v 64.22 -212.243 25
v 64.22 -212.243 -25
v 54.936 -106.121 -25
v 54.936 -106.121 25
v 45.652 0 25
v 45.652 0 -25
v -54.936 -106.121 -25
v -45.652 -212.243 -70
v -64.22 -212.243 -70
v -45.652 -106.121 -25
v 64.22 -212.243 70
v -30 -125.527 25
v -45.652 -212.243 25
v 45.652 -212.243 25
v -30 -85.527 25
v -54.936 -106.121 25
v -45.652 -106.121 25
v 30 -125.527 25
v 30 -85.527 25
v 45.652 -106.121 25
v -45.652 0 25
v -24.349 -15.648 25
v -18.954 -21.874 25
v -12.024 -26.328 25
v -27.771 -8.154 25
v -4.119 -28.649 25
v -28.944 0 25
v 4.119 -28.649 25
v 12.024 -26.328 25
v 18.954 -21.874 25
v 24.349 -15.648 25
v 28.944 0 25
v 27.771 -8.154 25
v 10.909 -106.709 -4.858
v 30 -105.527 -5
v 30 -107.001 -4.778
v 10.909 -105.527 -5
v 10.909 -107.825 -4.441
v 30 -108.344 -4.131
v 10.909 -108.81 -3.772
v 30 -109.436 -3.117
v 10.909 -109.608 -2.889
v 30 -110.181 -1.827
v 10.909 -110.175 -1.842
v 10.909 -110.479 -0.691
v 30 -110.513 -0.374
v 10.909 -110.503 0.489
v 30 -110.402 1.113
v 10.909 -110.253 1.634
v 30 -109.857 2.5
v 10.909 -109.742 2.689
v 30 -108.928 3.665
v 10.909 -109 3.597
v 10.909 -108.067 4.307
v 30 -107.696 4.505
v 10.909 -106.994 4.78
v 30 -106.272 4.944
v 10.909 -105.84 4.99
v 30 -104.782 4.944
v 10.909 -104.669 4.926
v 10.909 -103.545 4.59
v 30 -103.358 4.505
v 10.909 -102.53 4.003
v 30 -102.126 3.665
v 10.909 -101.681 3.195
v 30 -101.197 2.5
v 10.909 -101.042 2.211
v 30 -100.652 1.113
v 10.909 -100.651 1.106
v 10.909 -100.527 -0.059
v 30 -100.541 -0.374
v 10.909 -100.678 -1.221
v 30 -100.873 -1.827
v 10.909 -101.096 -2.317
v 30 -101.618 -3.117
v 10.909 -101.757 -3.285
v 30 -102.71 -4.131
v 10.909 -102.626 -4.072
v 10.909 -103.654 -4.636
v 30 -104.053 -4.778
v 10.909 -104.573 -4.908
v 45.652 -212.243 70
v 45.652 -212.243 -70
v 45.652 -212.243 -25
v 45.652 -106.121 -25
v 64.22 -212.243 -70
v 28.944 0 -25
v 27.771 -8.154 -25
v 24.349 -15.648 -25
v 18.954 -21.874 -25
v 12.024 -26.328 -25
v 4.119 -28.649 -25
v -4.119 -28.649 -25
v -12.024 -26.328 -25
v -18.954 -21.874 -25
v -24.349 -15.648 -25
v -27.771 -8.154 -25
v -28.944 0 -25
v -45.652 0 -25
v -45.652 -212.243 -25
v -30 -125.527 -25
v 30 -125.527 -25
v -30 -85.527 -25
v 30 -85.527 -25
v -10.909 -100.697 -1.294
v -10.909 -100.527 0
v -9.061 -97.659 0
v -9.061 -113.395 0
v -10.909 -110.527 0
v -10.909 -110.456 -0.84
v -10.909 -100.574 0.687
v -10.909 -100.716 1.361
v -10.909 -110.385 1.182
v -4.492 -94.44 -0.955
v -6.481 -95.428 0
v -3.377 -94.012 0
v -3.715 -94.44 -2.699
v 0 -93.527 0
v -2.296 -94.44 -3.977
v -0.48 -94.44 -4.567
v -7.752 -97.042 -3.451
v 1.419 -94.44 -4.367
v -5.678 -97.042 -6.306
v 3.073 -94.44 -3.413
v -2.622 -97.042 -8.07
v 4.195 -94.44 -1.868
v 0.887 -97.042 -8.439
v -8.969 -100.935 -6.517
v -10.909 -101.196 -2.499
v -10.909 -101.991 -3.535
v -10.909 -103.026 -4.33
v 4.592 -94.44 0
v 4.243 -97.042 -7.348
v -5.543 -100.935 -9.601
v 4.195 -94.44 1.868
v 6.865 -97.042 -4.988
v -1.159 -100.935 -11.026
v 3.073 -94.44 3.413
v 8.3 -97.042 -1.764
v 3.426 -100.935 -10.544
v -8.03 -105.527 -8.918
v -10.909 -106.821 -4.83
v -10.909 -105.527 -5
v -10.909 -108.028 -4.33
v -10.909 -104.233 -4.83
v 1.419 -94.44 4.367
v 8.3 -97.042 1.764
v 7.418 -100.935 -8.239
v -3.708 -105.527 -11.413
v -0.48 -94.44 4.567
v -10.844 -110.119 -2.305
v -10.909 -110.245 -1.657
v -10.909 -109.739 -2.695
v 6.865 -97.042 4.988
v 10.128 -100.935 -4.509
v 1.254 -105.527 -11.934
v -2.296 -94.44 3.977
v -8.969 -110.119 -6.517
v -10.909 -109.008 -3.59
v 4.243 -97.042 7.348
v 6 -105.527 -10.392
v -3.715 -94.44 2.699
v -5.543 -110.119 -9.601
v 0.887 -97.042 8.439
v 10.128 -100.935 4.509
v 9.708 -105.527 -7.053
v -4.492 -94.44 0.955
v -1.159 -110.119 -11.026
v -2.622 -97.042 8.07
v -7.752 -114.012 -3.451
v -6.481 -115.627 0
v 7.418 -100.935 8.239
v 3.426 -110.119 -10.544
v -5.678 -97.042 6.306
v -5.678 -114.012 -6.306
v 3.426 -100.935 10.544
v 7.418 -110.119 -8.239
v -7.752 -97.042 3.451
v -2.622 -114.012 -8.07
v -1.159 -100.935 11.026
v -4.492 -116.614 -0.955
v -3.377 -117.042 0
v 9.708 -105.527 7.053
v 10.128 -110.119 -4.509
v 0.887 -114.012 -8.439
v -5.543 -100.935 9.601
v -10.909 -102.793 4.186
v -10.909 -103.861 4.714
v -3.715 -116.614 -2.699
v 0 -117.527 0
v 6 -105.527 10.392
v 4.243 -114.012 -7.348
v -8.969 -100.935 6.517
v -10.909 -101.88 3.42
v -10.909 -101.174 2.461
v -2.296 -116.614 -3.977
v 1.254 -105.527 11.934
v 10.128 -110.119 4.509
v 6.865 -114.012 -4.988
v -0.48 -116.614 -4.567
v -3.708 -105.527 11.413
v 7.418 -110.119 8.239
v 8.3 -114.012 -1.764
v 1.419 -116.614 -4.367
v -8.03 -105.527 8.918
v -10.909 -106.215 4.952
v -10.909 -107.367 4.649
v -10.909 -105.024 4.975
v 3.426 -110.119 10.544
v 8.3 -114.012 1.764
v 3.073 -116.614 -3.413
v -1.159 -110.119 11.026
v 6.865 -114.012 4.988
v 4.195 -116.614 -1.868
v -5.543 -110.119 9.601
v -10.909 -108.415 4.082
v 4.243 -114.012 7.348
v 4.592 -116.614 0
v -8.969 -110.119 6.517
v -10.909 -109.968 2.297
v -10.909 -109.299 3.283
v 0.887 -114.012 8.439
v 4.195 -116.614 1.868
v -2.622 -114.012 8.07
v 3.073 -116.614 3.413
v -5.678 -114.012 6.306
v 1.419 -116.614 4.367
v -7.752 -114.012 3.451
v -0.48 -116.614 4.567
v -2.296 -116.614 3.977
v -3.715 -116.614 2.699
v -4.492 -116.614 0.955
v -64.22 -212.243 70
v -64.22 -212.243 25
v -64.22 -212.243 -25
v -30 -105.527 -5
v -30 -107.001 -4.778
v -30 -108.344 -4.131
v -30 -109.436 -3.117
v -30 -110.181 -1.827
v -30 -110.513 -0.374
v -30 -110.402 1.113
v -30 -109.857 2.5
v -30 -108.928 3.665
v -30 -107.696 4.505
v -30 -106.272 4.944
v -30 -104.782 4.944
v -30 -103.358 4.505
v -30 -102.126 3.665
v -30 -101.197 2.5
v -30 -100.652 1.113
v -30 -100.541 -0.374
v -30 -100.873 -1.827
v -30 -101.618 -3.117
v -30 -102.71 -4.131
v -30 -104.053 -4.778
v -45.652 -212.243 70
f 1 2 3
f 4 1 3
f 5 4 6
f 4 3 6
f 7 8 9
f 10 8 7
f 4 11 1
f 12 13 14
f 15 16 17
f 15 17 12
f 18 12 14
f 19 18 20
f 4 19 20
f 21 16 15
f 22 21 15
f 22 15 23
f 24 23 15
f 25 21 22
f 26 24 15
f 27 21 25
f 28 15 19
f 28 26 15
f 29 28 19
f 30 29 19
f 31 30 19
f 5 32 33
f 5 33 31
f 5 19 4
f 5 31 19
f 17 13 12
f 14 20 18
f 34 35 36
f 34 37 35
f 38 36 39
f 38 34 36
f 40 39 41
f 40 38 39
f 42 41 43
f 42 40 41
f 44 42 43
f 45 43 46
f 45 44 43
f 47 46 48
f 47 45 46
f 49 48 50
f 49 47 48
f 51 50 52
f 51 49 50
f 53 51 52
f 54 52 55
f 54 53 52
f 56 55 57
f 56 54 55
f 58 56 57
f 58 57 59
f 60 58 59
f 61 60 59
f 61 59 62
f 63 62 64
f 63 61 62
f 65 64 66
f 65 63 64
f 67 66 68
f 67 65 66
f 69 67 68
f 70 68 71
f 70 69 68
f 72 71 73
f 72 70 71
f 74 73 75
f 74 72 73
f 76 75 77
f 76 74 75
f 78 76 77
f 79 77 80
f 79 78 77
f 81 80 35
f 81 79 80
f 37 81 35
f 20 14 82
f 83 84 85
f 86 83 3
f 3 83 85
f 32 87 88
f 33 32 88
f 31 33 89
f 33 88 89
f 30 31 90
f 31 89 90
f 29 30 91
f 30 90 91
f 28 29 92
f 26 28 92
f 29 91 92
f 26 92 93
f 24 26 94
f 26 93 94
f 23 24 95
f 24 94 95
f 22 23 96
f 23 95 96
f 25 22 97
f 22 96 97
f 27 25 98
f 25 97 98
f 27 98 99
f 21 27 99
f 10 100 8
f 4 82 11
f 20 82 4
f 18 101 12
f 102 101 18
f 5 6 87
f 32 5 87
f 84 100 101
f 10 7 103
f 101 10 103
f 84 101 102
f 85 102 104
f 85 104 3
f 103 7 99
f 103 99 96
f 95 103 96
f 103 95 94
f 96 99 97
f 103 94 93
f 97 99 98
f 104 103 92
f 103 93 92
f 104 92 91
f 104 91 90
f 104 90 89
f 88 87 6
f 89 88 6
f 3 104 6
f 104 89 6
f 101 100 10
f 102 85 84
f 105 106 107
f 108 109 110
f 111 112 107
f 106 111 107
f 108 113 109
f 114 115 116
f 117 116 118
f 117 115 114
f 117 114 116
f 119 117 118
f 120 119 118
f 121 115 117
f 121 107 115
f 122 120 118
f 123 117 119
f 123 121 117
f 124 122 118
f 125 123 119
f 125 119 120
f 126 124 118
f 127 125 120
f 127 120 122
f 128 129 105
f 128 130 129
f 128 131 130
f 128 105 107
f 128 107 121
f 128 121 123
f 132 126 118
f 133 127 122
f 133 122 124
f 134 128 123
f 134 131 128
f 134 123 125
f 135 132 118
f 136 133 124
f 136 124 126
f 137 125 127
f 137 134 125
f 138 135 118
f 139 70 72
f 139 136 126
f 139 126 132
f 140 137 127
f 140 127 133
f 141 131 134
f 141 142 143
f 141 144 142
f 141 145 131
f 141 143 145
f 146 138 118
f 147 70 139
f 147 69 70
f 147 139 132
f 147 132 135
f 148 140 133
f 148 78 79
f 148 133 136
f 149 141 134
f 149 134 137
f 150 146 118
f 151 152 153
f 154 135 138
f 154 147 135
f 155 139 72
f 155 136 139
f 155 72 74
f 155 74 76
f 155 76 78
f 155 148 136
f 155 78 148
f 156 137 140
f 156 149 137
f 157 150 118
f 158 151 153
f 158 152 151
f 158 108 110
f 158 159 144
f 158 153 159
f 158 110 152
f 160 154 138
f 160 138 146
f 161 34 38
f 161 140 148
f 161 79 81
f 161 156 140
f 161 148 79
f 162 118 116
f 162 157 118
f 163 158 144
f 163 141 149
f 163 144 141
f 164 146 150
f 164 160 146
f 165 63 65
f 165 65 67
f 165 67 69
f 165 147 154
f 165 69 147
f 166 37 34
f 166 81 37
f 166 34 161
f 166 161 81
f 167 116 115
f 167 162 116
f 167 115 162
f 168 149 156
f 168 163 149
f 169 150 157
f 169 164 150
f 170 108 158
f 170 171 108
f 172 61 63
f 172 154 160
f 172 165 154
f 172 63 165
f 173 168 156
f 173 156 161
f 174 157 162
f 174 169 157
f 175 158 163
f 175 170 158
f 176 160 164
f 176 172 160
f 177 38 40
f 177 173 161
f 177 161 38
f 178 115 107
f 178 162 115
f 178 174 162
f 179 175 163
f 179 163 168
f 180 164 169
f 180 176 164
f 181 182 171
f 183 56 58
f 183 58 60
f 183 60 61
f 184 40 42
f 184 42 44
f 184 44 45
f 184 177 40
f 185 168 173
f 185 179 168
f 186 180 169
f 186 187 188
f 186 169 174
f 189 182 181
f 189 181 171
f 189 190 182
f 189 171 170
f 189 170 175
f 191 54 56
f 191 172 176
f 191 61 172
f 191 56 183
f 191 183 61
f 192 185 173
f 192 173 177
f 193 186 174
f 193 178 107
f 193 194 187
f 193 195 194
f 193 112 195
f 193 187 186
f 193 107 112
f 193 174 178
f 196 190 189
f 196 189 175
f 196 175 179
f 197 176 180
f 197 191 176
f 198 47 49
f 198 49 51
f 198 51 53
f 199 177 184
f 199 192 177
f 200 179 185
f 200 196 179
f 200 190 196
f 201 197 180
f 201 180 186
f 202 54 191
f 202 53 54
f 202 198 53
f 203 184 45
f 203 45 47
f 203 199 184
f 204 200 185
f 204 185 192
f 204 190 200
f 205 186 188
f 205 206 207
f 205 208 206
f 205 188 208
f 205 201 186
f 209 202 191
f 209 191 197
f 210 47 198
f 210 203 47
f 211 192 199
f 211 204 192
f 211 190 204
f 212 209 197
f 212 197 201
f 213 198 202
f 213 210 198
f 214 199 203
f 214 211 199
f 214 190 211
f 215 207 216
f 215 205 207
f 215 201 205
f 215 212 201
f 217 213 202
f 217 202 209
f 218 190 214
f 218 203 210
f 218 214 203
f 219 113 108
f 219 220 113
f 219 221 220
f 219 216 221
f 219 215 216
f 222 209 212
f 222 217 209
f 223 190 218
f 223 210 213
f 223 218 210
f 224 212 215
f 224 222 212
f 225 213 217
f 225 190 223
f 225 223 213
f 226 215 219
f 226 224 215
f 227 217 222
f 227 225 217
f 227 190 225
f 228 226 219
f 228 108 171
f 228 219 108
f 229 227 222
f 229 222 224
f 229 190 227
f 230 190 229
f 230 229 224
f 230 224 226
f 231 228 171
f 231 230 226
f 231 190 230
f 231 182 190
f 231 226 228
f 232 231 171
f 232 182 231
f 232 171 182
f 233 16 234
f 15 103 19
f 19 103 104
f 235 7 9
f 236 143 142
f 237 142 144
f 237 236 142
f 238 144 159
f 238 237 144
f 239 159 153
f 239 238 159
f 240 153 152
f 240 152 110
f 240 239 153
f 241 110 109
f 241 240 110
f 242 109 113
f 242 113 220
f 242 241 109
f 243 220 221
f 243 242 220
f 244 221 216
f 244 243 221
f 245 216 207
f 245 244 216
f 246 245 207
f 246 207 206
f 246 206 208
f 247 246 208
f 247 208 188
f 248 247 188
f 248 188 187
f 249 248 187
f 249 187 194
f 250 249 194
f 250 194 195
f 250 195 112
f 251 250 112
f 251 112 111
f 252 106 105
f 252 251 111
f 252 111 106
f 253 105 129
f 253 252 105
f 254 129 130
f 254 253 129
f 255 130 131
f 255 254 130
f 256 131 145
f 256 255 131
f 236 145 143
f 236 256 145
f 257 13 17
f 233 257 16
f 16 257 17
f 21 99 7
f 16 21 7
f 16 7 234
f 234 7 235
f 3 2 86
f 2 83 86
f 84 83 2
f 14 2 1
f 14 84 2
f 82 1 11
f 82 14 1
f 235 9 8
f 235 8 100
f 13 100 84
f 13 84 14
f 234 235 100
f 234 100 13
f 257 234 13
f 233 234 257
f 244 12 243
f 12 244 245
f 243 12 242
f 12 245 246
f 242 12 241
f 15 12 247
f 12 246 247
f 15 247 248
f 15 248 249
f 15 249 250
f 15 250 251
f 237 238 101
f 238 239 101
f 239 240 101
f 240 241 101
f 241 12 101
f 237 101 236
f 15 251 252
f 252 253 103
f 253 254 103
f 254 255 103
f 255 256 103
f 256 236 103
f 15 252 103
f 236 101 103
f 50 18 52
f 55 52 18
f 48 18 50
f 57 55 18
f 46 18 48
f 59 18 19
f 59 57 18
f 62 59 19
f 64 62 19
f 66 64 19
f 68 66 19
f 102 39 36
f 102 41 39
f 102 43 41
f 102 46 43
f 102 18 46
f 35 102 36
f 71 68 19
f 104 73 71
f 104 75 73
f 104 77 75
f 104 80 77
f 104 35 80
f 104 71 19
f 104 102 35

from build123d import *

# Parameters (mm, degrees)
BOSS_EXTRUDE1_DEPTH      = 25
BOSS_EXTRUDE1_DEPTH_BACK = 25
SKETCH2_W                = 60
SKETCH2_H                = 40
BOSS_EXTRUDE7_REACH      = 242.299
BOSS_EXTRUDE8_REACH      = 251.036
SWEEP3_PROFILE_R         = 5


with BuildPart() as part:
    # Sketch2 → Boss-Extrude1 (new, two sides: drawn at the far end of the back side and taken through both)
    with BuildSketch(Plane.XY.offset(-BOSS_EXTRUDE1_DEPTH_BACK)):
        with BuildLine():
            Line((-28.9435, 0), (-45.651634272, 0))
            Line((-45.651634272, 0), (-64.220455689, -212.2426))
            Line((-64.220455689, -212.2426), (64.220455689, -212.2426))
            Line((64.220455689, -212.2426), (45.651634272, 0))
            Line((45.651634272, 0), (28.9435, 0))
            ThreePointArc((28.9435, 0), (0, -28.9435), (-28.9435, 0))
        make_face()
        with Locations((0, -105.527024802)):
            Rectangle(SKETCH2_W, SKETCH2_H, mode=Mode.SUBTRACT)
    extrude(amount=BOSS_EXTRUDE1_DEPTH + BOSS_EXTRUDE1_DEPTH_BACK)

    # Boss-Extrude7: up to this plane
    boss_extrude7_end = Plane(origin=(-45.651634272, 0, -25), z_dir=(-0.9961946980917452, 0.08715574274766147, 0))
    # Sketch58 → Boss-Extrude7 (add, up to the surface)
    with BuildSketch(Plane(origin=(-45.651634272, 0, 0), x_dir=(0, 0, -1), z_dir=(1, 0, 0)), mode=Mode.PRIVATE) as boss_extrude7_sk1:
        Polygon((25, -106.1213), (25, -212.2426), (70, -212.2426), align=None)
    boss_extrude7_tool1 = split(extrude(boss_extrude7_sk1.sketch, amount=-BOSS_EXTRUDE7_REACH, mode=Mode.PRIVATE), bisect_by=boss_extrude7_end, keep=Keep.BOTH, mode=Mode.PRIVATE)
    add(boss_extrude7_tool1.solids().sort_by_distance((-45.651634, -176.868833, -40))[0])
    # Sketch58 → Boss-Extrude7 (add, up to the surface)
    with BuildSketch(Plane(origin=(-45.651634272, 0, 0), x_dir=(0, 0, -1), z_dir=(1, 0, 0)), mode=Mode.PRIVATE) as boss_extrude7_sk2:
        Polygon((-25, -212.2426), (-70, -212.2426), (-25, -106.1213), align=None)
    boss_extrude7_tool2 = split(extrude(boss_extrude7_sk2.sketch, amount=-BOSS_EXTRUDE7_REACH, mode=Mode.PRIVATE), bisect_by=boss_extrude7_end, keep=Keep.BOTH, mode=Mode.PRIVATE)
    add(boss_extrude7_tool2.solids().sort_by_distance((-45.651634, -176.868833, 40))[0])

    # Boss-Extrude8: up to this plane
    boss_extrude8_end = Plane(origin=(45.651634272, 0, -25), z_dir=(0.9961946980917452, 0.08715574274766147, 0))
    # Sketch59 → Boss-Extrude8 (add, up to the surface)
    with BuildSketch(Plane(origin=(45.651634272, 0, 0), x_dir=(0, 0, -1), z_dir=(1, 0, 0)), mode=Mode.PRIVATE) as boss_extrude8_sk1:
        Polygon((25, -106.1213), (25, -212.2426), (70, -212.2426), align=None)
    boss_extrude8_tool1 = split(extrude(boss_extrude8_sk1.sketch, amount=BOSS_EXTRUDE8_REACH, mode=Mode.PRIVATE), bisect_by=boss_extrude8_end, keep=Keep.BOTH, mode=Mode.PRIVATE)
    add(boss_extrude8_tool1.solids().sort_by_distance((45.651634, -176.868833, -40))[0])
    # Sketch59 → Boss-Extrude8 (add, up to the surface)
    with BuildSketch(Plane(origin=(45.651634272, 0, 0), x_dir=(0, 0, -1), z_dir=(1, 0, 0)), mode=Mode.PRIVATE) as boss_extrude8_sk2:
        Polygon((-25, -212.2426), (-70, -212.2426), (-25, -106.1213), align=None)
    boss_extrude8_tool2 = split(extrude(boss_extrude8_sk2.sketch, amount=BOSS_EXTRUDE8_REACH, mode=Mode.PRIVATE), bisect_by=boss_extrude8_end, keep=Keep.BOTH, mode=Mode.PRIVATE)
    add(boss_extrude8_tool2.solids().sort_by_distance((45.651634, -176.868833, 40))[0])



with BuildPart() as body_2:
    # Sketch60 → Revolve9 (revolve)
    with BuildSketch(Plane.XY):
        with BuildLine():
            Line((0, -117.527024802), (0, -93.527024802))
            ThreePointArc((0, -93.527024802), (-12, -105.527024802), (0, -117.527024802))
        make_face()
    revolve(axis=Axis((0, 0, 0), (0, -1, 0)))


with BuildPart() as part_1:
    add(part.part)

    add(body_2.part)  # Sweep3 merges body 2
    # Sweep3: sweep along a path in Sketch62
    with BuildLine(Plane.XY) as sweep3_path:
        Line((30, -105.527024802), (-30, -105.527024802))
    # Sweep3 profile (on start of the path) → Sweep3 (sweep)
    with BuildSketch(Plane(origin=(30, -105.527024802, 0), x_dir=(0, 0, -1), z_dir=(-1, 0, 0))):
        Circle(SWEEP3_PROFILE_R)
    sweep(path=sweep3_path.line)


solid = part_1.part
